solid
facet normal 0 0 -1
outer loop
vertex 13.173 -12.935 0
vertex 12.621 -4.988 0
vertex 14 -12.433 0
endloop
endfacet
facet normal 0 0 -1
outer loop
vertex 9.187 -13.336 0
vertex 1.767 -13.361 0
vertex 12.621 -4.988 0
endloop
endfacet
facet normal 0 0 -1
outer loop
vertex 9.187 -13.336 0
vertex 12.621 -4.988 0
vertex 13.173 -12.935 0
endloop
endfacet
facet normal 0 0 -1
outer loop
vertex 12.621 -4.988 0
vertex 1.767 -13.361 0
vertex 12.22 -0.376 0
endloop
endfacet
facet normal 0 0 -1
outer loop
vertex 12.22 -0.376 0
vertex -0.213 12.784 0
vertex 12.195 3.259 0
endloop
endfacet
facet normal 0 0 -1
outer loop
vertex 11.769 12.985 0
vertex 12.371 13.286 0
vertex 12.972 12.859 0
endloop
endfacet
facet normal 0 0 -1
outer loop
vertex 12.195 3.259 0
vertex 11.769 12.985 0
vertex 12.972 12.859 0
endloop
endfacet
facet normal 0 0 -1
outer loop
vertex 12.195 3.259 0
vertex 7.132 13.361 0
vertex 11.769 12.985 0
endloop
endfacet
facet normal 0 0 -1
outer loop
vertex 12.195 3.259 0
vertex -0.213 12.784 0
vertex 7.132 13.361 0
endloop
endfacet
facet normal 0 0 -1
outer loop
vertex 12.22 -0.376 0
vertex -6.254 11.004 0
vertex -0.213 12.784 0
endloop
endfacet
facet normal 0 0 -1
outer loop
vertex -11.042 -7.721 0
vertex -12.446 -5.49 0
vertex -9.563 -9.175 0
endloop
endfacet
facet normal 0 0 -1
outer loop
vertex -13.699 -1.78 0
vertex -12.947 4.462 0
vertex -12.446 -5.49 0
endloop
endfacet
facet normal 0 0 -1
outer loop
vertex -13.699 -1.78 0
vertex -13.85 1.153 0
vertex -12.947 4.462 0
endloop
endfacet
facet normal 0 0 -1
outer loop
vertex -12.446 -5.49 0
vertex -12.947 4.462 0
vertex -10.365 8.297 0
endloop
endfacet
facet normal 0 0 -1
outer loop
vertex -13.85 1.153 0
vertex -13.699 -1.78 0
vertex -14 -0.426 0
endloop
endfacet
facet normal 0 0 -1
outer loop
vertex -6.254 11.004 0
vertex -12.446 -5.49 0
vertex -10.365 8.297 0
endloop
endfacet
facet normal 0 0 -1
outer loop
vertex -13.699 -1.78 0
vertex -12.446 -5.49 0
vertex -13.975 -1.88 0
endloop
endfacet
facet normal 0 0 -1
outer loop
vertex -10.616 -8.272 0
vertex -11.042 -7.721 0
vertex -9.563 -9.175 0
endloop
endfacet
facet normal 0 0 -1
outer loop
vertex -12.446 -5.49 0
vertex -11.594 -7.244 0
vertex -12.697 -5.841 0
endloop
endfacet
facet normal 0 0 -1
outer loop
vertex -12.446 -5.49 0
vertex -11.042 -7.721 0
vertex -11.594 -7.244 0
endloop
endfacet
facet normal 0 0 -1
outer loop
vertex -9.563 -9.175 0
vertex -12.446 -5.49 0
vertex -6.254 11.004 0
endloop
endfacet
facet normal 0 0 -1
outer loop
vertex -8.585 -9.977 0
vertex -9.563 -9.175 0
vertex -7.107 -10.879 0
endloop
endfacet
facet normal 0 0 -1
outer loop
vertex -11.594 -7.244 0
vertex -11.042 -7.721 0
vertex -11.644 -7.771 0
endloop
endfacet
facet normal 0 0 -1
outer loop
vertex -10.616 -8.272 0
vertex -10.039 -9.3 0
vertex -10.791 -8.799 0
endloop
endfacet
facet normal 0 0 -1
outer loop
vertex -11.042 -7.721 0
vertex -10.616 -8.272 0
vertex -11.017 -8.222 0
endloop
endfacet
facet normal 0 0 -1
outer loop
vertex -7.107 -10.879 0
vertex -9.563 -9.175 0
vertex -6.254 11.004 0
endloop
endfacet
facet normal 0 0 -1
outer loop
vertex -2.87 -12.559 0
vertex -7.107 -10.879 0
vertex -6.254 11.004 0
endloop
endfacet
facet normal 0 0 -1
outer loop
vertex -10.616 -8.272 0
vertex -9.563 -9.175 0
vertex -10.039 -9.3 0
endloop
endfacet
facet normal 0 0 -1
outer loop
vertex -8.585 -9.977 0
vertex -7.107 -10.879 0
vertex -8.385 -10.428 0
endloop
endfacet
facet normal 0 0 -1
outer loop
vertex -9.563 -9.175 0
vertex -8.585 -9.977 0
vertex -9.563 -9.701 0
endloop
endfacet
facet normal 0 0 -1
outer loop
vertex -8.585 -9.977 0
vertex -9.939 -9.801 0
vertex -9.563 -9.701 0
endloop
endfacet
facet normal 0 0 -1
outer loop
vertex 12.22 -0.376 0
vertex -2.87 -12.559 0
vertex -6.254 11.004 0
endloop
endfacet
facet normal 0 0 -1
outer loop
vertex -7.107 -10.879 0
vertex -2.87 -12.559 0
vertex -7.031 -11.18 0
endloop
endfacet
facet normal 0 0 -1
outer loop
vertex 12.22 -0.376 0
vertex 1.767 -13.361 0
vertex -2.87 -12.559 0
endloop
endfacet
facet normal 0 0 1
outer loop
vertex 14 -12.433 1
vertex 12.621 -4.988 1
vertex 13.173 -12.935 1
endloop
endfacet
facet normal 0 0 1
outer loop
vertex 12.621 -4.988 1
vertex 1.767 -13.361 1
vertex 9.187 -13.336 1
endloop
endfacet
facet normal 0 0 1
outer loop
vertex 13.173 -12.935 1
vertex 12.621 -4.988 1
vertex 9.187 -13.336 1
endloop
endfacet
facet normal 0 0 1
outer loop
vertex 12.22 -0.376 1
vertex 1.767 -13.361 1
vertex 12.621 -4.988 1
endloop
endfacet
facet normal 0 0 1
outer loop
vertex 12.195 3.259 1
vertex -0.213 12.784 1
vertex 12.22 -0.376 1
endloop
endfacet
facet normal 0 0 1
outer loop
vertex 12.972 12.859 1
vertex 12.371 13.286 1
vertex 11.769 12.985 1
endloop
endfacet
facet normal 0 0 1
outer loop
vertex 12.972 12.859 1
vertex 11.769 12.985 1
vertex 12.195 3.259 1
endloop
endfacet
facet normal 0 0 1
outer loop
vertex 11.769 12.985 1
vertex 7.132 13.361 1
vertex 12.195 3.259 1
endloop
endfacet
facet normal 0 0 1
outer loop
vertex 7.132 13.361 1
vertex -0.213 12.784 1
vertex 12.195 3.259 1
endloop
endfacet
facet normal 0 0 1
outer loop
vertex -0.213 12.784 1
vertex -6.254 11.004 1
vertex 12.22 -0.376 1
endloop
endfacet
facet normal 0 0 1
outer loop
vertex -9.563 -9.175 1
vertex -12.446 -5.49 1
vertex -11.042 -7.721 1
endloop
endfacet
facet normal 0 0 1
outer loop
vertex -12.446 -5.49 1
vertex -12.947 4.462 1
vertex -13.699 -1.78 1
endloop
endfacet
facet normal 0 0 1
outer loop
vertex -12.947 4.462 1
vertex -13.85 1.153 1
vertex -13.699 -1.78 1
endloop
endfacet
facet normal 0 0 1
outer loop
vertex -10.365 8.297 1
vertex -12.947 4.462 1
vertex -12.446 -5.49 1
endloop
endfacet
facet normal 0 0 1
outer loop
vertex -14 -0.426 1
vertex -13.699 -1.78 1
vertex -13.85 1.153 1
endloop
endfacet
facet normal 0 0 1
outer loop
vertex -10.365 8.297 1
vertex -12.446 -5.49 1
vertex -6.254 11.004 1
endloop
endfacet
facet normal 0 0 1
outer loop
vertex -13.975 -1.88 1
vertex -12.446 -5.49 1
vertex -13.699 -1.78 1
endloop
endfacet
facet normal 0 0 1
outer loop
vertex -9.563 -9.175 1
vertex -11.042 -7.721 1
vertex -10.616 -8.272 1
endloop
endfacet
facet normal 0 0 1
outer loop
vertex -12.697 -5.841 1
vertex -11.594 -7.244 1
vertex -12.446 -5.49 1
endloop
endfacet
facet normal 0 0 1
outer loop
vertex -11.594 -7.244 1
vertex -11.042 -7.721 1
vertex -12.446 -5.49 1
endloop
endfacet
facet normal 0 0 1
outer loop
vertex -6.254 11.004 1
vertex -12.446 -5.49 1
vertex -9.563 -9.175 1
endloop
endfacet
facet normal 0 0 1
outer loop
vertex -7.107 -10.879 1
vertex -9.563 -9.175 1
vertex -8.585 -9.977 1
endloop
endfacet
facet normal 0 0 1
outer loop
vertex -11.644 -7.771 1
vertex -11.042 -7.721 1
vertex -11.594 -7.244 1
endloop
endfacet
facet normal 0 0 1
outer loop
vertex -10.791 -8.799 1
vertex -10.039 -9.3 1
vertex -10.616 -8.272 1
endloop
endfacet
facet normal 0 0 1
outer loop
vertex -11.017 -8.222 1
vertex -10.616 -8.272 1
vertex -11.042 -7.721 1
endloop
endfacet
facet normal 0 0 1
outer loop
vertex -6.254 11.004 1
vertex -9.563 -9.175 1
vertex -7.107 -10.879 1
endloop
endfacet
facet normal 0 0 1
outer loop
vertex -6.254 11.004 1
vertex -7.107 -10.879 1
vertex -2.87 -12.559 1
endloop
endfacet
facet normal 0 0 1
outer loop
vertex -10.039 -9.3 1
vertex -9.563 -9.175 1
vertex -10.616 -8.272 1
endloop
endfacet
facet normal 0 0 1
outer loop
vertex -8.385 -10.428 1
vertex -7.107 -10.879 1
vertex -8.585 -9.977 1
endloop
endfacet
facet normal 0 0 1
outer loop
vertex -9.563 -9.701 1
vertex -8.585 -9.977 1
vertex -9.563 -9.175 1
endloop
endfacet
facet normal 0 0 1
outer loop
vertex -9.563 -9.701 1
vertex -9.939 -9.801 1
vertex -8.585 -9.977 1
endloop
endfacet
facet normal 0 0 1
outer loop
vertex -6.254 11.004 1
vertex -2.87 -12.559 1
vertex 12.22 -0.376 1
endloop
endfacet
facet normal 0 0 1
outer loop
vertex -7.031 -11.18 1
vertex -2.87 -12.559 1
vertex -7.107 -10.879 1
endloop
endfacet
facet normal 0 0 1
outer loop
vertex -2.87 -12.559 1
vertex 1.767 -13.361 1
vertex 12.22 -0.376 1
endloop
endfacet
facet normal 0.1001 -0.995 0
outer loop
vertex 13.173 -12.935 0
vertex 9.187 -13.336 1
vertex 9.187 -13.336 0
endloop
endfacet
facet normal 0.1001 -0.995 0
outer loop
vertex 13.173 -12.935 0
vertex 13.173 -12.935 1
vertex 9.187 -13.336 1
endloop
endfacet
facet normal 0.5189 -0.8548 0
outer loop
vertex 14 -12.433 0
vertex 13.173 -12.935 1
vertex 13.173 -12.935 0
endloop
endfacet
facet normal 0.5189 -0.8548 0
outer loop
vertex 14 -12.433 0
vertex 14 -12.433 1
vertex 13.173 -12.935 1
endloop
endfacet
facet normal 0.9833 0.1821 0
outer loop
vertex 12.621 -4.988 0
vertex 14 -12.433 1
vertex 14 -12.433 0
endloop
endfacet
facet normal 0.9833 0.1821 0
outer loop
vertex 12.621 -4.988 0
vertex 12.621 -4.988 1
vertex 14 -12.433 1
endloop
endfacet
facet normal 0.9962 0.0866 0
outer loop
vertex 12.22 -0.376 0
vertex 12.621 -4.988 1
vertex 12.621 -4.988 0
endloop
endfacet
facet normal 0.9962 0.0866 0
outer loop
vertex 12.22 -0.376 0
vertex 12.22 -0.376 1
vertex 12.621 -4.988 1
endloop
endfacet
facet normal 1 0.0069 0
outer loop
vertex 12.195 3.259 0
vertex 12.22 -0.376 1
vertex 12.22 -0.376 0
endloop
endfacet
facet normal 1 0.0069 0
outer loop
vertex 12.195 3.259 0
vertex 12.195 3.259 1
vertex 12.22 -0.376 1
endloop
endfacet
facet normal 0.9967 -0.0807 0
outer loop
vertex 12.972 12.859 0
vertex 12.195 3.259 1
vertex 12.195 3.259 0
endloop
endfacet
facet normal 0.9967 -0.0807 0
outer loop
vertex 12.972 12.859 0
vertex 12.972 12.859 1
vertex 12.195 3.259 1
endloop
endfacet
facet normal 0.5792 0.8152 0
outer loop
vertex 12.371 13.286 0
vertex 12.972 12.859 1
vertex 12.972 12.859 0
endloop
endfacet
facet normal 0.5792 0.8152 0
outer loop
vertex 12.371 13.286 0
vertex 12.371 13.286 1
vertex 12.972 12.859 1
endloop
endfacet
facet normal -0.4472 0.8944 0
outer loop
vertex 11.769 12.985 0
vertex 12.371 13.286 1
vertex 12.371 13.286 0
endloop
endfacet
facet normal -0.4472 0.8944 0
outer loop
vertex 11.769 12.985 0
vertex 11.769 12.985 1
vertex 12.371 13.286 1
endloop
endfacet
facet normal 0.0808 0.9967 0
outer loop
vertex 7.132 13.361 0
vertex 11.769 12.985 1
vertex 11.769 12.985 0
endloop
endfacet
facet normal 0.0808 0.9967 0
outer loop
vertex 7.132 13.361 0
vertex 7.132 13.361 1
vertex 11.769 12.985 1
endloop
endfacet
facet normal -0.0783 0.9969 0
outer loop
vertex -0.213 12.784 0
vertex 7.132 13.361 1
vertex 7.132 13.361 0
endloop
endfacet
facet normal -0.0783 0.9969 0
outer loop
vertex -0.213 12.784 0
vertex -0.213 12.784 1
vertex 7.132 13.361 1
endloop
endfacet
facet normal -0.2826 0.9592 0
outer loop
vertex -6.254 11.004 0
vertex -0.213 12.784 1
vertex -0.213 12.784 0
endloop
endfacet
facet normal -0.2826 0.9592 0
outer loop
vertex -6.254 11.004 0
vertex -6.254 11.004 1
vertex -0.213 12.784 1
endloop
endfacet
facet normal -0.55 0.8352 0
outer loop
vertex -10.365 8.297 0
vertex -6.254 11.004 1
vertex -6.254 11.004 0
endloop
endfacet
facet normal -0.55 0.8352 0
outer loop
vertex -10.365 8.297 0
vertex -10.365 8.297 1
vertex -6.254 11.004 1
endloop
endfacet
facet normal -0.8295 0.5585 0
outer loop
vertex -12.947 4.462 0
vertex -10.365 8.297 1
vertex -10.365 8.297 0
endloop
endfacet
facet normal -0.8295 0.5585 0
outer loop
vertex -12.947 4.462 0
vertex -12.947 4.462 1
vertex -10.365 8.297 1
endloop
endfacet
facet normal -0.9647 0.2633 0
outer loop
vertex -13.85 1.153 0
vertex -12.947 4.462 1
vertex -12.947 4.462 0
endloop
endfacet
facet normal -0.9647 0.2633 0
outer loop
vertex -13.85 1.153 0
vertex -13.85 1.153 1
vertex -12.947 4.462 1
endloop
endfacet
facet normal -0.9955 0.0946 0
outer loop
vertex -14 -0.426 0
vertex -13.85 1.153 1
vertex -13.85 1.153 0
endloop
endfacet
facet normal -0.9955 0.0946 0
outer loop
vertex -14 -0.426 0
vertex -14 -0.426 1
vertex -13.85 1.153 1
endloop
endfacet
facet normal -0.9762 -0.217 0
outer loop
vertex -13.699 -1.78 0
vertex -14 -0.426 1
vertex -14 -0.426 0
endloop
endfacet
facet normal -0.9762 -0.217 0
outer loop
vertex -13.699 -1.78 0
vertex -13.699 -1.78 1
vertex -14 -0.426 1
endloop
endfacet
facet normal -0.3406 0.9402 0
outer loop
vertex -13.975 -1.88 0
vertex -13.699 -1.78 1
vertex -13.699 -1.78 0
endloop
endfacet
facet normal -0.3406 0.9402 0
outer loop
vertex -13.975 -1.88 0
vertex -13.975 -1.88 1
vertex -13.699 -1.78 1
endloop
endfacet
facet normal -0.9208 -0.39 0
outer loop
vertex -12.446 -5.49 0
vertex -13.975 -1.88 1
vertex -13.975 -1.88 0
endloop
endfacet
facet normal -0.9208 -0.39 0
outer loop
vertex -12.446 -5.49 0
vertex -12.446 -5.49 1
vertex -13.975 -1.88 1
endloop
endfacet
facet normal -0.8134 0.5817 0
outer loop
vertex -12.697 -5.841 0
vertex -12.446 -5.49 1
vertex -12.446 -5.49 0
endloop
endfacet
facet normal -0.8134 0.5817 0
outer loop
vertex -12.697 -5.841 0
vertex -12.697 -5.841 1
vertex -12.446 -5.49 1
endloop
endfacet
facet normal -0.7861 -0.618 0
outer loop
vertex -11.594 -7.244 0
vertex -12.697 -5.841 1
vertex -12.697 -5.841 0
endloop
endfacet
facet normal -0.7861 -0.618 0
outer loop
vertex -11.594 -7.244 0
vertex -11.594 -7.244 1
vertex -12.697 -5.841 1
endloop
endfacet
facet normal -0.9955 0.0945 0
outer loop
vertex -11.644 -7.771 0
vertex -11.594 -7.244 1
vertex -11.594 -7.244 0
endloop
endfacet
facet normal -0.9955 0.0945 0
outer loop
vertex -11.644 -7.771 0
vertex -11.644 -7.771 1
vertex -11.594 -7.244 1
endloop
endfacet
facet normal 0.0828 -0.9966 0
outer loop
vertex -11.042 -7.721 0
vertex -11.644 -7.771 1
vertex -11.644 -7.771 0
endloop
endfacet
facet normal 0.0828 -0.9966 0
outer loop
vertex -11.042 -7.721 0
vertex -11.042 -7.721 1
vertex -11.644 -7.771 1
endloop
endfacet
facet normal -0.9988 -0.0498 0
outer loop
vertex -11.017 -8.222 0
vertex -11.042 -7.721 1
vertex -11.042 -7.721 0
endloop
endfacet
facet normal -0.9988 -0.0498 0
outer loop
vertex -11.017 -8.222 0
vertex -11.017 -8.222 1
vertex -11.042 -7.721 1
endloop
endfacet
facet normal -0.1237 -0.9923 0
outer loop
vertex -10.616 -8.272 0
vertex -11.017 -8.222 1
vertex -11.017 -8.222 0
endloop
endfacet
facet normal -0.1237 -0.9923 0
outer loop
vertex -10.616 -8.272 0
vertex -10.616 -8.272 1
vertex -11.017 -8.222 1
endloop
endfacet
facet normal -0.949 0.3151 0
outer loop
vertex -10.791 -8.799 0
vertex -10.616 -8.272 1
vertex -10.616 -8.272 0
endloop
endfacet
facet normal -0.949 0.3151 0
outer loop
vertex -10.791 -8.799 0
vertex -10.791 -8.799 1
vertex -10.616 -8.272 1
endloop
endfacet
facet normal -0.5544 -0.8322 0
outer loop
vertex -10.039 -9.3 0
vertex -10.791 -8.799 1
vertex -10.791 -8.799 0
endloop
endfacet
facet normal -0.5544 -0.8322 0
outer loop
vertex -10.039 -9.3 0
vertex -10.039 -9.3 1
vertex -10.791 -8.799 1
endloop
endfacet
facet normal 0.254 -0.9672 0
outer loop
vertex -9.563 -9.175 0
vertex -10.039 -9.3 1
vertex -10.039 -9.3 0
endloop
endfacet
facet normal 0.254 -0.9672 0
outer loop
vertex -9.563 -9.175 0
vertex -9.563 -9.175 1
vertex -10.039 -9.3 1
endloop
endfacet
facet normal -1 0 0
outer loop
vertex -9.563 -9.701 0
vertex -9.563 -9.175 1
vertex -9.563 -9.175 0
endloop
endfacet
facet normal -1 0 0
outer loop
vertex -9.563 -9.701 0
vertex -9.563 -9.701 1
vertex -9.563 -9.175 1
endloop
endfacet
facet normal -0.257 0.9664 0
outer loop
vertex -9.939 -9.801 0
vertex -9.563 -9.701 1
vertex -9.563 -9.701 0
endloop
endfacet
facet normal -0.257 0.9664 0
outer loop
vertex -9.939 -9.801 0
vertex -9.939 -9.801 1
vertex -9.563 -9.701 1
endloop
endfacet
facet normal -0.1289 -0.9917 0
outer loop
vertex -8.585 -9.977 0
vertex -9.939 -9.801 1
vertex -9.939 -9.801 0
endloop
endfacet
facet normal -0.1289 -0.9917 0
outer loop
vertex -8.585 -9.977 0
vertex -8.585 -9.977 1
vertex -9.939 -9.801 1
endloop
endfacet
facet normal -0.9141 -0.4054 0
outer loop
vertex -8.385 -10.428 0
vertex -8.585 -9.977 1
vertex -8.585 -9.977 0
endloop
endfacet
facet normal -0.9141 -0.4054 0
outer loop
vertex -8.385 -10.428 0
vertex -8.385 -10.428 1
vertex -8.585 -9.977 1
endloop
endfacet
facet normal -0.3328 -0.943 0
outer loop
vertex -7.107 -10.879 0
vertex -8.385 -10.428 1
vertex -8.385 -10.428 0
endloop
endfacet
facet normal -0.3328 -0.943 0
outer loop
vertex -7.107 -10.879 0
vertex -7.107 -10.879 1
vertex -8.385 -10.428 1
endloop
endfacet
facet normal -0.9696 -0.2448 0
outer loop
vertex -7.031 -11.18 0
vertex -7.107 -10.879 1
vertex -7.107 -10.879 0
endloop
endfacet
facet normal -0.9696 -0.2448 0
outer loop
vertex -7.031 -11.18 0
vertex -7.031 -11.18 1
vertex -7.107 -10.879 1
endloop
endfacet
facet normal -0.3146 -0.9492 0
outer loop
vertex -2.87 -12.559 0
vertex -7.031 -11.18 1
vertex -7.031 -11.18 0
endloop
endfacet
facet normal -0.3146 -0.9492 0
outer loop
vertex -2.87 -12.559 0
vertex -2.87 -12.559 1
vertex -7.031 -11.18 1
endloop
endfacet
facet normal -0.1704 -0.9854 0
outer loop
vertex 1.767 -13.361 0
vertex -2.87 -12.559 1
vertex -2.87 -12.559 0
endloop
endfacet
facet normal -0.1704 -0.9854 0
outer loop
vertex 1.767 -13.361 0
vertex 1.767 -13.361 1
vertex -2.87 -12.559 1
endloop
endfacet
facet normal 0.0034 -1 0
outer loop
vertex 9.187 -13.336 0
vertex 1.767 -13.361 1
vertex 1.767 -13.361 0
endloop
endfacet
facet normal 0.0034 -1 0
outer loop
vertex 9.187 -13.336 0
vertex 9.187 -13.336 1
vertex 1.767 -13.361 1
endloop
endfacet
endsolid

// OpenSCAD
/*
Traced from the supplied overhead photograph.

Overall width: 28.0 mm
Approximate height from photograph: 26.722 mm
Thickness: 1.0 mm

The photograph provides reliable plan-view geometry but not reliable
depth information for the molded-looking surface features, so this model
reproduces the outside profile as a uniform 1 mm thick part.
*/

part_width = 28.0;
part_thickness = 1.0;

module plastic_piece_2d() {
    polygon(points=[
        [12.972, 12.859],
        [12.371, 13.286],
        [11.769, 12.985],
        [7.132, 13.361],
        [-0.213, 12.784],
        [-6.254, 11.004],
        [-10.365, 8.297],
        [-12.947, 4.462],
        [-13.850, 1.153],
        [-14.000, -0.426],
        [-13.699, -1.780],
        [-13.975, -1.880],
        [-12.446, -5.490],
        [-12.697, -5.841],
        [-11.594, -7.244],
        [-11.644, -7.771],
        [-11.042, -7.721],
        [-11.017, -8.222],
        [-10.616, -8.272],
        [-10.791, -8.799],
        [-10.039, -9.300],
        [-9.563, -9.175],
        [-9.563, -9.701],
        [-9.939, -9.801],
        [-8.585, -9.977],
        [-8.385, -10.428],
        [-7.107, -10.879],
        [-7.031, -11.180],
        [-2.870, -12.559],
        [1.767, -13.361],
        [9.187, -13.336],
        [13.173, -12.935],
        [14.000, -12.433],
        [12.621, -4.988],
        [12.220, -0.376],
        [12.195, 3.259]
    ]);
}

linear_extrude(height=part_thickness, convexity=10)
    plastic_piece_2d();
